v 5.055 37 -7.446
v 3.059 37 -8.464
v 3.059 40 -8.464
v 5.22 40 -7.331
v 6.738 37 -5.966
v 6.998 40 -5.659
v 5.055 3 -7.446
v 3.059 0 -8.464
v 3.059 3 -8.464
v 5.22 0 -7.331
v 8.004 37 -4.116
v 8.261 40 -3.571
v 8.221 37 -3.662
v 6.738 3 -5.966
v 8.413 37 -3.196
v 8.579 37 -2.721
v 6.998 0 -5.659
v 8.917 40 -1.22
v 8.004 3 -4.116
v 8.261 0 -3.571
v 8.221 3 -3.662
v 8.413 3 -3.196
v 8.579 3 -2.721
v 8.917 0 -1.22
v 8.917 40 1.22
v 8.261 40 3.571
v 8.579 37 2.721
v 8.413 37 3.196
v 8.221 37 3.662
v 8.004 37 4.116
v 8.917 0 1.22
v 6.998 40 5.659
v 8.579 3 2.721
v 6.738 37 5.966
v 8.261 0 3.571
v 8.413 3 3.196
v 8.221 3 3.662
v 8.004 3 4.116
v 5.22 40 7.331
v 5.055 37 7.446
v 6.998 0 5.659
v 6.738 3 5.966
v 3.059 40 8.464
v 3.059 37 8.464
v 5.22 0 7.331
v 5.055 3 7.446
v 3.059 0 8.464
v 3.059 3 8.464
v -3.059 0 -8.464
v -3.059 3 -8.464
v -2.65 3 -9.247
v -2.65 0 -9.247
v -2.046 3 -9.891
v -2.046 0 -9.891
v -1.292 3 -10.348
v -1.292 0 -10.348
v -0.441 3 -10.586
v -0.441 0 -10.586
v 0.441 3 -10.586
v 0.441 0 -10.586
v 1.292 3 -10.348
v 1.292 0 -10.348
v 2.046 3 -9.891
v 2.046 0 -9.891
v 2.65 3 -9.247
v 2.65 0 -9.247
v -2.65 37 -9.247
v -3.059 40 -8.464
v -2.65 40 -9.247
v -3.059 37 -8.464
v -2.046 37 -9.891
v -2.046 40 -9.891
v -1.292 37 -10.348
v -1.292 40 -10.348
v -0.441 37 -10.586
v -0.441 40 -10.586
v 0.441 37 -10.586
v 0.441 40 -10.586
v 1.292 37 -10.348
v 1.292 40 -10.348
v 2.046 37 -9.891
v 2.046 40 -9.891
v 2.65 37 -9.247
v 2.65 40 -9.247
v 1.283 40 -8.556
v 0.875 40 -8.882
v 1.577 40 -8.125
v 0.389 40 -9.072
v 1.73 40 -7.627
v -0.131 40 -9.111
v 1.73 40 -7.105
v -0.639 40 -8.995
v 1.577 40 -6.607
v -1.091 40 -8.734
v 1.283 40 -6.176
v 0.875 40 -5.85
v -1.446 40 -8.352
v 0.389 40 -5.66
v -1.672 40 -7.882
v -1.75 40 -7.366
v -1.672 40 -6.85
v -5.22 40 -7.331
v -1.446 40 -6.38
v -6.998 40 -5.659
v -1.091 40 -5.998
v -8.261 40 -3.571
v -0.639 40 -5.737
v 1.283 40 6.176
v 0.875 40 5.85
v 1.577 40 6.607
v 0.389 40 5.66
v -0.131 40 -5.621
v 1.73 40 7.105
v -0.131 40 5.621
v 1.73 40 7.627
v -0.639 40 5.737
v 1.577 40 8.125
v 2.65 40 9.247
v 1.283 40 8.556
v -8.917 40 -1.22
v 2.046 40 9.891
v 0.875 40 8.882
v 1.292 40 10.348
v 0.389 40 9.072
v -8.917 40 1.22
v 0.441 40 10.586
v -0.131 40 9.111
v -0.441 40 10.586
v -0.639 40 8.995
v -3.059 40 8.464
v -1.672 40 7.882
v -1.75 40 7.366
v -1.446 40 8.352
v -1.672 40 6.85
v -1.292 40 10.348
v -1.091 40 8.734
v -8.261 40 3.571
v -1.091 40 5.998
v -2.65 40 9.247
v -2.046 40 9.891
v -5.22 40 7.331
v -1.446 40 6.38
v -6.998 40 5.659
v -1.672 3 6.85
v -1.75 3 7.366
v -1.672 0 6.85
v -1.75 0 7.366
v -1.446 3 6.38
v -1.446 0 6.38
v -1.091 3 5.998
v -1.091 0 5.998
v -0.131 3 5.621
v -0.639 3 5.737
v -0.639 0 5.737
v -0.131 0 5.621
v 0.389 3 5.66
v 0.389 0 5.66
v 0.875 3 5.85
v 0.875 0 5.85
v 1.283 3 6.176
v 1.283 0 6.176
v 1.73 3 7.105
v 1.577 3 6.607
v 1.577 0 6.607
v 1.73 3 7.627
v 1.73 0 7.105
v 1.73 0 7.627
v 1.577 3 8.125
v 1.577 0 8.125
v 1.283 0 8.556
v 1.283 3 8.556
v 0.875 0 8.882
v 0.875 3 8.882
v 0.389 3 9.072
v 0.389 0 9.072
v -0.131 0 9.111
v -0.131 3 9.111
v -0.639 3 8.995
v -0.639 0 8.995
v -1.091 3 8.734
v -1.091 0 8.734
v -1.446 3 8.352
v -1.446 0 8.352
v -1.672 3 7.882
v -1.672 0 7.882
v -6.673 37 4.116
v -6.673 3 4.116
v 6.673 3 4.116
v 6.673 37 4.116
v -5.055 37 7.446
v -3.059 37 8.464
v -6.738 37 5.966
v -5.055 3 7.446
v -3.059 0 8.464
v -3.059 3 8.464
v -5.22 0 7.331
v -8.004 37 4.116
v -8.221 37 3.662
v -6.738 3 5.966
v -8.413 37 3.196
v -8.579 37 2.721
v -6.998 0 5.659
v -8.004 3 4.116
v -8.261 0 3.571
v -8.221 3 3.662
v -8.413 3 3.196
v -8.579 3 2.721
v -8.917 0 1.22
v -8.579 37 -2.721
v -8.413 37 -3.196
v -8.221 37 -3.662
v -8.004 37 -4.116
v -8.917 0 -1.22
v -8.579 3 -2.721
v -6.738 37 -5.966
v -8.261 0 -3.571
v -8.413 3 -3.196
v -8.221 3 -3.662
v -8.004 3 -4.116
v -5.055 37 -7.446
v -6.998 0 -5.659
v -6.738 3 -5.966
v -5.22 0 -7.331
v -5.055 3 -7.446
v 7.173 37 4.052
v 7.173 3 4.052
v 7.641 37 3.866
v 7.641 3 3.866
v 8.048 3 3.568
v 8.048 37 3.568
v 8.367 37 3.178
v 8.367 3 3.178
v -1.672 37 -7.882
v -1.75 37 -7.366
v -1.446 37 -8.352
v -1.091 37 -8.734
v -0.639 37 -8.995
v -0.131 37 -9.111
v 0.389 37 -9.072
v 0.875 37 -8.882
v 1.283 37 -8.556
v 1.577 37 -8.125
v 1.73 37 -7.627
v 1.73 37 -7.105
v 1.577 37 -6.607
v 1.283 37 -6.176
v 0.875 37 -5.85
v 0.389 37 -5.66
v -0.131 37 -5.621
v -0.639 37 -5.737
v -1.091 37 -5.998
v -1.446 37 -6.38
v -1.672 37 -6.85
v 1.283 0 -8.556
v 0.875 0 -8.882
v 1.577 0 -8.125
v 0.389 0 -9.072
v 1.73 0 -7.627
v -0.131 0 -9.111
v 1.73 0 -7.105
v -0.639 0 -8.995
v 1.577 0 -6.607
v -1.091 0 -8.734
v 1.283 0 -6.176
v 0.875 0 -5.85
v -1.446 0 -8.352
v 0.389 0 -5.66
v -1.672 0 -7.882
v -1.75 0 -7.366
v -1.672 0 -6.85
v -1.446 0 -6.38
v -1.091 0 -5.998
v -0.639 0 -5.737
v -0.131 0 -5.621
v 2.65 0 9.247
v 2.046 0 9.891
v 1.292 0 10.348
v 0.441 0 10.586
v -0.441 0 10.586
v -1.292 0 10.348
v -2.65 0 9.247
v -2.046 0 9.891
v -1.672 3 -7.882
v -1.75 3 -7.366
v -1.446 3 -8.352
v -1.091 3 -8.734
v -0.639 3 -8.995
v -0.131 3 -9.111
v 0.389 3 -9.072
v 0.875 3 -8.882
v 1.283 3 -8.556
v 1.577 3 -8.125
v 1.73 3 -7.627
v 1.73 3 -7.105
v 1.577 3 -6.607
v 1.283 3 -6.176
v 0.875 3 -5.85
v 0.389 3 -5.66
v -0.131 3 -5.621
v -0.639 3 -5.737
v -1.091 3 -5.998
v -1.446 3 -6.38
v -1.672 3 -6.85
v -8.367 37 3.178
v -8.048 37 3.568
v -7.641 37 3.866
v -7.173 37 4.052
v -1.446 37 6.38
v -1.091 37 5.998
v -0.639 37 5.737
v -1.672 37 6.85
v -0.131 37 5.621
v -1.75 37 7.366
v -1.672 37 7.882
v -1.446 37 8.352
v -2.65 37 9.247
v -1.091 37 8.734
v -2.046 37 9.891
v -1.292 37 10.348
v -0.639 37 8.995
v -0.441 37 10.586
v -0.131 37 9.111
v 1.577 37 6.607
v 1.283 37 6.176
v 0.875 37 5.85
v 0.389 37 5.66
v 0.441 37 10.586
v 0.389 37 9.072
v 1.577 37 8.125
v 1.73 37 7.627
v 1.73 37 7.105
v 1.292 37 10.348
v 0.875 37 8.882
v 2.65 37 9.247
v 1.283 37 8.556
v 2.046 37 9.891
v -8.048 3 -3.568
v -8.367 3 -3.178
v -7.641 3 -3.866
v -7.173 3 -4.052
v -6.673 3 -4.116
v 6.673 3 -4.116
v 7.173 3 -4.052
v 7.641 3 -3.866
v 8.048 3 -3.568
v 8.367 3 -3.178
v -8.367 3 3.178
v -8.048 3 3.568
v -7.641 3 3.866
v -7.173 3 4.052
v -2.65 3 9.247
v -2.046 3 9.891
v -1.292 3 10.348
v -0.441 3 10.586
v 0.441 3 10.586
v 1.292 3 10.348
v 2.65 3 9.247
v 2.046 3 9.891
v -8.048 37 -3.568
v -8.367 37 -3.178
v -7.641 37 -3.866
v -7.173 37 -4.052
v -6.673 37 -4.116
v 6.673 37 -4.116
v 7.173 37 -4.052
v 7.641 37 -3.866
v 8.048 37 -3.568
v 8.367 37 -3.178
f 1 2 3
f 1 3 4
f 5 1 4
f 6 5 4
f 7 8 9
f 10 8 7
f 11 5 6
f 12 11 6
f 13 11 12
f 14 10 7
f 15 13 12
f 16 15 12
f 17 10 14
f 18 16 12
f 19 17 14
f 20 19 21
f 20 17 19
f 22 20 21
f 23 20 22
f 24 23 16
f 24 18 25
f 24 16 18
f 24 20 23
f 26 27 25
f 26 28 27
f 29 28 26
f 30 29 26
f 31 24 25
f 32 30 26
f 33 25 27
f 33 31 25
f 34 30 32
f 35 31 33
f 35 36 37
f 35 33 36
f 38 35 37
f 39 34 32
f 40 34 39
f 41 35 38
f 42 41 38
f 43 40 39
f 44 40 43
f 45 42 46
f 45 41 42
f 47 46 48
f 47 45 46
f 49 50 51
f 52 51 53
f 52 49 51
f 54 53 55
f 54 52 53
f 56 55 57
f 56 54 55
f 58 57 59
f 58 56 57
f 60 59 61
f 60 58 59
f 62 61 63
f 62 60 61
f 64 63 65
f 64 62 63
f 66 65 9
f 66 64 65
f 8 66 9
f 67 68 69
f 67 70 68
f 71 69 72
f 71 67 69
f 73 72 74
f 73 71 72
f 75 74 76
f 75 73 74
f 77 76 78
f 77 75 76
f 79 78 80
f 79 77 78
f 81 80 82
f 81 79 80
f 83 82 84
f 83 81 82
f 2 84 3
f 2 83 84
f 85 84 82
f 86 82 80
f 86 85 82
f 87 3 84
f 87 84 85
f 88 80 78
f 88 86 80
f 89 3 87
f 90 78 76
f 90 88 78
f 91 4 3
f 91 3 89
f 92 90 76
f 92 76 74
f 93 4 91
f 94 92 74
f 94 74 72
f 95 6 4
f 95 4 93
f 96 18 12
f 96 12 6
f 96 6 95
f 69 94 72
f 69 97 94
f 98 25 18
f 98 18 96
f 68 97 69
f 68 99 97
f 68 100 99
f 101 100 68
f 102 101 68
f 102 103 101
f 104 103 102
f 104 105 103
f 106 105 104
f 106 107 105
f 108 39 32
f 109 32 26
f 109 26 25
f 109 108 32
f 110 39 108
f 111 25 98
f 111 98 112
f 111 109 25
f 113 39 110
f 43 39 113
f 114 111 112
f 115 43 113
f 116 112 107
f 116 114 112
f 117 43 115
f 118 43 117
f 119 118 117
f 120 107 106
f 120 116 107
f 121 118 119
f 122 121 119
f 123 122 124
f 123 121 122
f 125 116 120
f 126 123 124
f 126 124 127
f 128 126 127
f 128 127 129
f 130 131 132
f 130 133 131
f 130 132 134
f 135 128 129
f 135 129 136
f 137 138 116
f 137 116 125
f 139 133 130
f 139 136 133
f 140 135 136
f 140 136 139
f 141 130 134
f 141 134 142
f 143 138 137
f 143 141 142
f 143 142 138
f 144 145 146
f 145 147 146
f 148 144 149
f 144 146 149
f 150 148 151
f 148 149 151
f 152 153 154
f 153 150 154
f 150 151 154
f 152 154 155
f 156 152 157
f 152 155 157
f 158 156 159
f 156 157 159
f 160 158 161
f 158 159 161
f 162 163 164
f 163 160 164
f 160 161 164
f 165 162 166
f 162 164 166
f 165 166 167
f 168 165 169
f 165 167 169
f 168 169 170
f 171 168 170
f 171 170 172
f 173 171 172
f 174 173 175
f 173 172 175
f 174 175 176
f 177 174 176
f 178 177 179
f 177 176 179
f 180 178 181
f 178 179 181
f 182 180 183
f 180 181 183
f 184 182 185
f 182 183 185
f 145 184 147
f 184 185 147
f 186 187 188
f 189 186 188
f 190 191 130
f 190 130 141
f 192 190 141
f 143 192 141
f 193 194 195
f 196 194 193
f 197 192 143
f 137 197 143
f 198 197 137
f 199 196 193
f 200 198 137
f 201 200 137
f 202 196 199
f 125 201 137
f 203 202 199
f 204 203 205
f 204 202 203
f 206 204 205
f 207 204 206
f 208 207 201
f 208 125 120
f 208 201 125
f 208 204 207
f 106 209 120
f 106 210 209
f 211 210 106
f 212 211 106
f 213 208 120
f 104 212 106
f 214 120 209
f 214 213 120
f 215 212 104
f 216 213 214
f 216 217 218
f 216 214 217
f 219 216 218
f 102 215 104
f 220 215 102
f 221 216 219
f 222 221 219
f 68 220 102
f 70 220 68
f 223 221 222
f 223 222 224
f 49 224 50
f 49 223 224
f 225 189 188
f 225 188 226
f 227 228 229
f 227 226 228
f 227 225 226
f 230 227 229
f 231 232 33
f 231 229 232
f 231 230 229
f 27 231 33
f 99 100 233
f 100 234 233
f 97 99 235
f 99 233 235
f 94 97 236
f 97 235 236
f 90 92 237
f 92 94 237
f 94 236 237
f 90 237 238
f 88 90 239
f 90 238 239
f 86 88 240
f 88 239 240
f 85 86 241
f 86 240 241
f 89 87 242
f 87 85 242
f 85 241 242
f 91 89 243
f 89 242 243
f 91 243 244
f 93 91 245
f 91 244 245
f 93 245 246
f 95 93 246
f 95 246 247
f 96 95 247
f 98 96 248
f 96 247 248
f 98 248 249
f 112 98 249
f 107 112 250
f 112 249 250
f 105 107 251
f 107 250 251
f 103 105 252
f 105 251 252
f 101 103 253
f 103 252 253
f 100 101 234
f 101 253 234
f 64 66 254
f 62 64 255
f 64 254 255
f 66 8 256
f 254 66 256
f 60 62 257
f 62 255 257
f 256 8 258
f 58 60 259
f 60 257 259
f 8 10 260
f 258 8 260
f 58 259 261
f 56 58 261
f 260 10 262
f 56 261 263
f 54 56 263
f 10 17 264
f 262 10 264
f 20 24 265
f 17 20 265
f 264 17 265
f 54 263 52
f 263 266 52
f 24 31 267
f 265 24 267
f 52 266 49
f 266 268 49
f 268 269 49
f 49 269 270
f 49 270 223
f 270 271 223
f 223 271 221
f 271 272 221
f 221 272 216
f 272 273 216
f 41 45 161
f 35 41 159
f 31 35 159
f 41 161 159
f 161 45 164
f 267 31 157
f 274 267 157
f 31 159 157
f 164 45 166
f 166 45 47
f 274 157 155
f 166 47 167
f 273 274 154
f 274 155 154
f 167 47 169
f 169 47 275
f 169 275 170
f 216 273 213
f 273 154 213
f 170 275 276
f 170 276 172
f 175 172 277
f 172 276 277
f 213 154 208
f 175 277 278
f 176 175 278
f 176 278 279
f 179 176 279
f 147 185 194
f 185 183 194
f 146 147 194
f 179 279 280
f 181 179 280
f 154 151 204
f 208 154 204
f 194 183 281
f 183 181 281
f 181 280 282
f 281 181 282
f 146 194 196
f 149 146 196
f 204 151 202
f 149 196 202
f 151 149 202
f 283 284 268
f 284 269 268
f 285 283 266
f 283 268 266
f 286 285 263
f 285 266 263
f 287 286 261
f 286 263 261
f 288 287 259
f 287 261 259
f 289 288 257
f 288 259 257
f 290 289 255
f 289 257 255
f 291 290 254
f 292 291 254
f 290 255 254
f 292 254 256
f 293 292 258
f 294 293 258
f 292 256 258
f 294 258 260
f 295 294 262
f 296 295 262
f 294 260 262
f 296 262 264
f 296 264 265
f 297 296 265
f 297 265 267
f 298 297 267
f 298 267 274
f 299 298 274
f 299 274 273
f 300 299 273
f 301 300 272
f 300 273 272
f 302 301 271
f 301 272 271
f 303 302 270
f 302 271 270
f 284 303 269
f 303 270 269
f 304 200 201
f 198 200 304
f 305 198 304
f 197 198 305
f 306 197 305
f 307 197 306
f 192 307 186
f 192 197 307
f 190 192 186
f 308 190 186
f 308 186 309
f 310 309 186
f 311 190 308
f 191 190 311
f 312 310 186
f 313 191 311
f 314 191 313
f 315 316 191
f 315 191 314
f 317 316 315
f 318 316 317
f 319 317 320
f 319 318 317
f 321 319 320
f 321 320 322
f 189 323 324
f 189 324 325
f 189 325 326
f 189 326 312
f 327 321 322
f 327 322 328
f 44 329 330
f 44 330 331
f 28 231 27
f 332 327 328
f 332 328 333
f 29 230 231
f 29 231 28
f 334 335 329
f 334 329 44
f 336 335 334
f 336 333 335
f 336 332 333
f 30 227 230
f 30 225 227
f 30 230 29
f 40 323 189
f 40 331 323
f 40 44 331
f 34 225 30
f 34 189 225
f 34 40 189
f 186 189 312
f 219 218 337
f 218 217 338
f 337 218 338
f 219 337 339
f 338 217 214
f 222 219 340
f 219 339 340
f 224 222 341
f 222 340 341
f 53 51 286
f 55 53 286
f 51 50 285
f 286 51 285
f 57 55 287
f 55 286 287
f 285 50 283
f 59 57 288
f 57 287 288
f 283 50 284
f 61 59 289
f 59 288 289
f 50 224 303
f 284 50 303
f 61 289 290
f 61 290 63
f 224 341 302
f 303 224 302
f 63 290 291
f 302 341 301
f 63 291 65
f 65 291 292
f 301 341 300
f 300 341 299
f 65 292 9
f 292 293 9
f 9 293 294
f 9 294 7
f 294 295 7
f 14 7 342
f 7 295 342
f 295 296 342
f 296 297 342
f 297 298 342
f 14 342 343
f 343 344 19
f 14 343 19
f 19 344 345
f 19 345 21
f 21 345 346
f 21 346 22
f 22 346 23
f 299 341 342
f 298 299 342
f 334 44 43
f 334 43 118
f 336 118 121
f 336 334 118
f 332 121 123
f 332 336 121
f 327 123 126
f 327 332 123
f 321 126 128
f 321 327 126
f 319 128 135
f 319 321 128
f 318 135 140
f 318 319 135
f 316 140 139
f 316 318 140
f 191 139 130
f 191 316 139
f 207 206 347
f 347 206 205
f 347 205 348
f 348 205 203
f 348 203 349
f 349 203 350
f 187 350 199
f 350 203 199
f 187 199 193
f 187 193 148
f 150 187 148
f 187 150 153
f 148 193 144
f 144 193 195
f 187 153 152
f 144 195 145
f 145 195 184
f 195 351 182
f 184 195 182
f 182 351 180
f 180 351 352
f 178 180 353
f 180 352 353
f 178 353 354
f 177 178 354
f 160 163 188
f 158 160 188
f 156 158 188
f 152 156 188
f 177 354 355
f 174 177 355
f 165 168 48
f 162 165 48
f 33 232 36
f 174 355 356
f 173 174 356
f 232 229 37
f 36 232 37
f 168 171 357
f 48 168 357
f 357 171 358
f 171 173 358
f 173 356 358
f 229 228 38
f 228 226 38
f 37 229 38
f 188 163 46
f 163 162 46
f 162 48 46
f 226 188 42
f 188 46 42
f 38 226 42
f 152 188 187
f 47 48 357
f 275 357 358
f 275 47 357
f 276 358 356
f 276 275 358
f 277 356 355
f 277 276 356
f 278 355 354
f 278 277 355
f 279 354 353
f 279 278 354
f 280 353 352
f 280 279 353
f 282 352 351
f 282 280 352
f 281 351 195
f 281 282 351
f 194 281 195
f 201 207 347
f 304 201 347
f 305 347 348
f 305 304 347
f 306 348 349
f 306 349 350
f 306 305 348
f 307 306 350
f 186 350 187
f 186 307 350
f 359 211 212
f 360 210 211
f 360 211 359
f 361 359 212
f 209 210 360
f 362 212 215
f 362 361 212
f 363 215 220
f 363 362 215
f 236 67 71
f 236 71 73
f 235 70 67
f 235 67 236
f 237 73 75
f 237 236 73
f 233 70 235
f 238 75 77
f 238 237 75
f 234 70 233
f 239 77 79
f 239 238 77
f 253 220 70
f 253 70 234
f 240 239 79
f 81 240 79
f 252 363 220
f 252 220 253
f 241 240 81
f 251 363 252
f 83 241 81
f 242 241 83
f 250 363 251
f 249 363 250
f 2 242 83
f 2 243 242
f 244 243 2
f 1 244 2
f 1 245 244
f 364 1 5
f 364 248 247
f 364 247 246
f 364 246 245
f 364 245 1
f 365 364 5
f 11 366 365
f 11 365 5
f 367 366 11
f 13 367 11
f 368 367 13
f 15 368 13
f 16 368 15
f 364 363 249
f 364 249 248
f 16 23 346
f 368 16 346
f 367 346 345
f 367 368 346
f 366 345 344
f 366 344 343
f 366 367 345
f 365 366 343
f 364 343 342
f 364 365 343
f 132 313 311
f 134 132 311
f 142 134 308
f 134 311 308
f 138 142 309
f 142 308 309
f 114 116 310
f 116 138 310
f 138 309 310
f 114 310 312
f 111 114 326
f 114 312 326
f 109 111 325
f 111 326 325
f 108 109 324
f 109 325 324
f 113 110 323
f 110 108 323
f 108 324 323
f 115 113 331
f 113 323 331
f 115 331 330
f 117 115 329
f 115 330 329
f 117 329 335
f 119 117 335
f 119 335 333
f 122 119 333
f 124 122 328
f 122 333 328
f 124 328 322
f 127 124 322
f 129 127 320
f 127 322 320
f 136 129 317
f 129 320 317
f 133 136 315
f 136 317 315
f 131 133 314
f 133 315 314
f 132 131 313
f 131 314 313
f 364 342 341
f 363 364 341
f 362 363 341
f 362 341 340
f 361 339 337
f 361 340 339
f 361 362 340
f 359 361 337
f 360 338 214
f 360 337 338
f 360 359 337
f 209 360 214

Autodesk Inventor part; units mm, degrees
ref_plane "YZ Plane" through (0, 0, 0) normal (1, 0, 0) x (0, 1, 0)
ref_plane "XZ Plane" through (0, 0, 0) normal (0, 1, 0) x (-1, 0, 0)
sketch "Sketch1" plane through (0, 0, 0) normal (0, 1, 0) x (-1, 0, 0)
  circle A0 centre (0, 7.366) radius 1.75
  circle A1 centre (0, -7.366) radius 1.75
  arc A2 (3.0588, -8.4643) -> (3.0588, 8.4643) centre (0, 0) ccw
  arc A3 (-3.0588, 8.4643) -> (-3.0588, -8.4643) centre (0, 0) ccw
  arc A4 (3.0588, 8.4643) -> (-3.0588, 8.4643) centre (0, 7.366) ccw
  arc A5 (-3.0588, -8.4643) -> (3.0588, -8.4643) centre (0, -7.366) ccw
  point P0 (9, 0)
extrude "Extrusion1" add sketch "Sketch1" along normal blind 40
ref_plane "Work Plane1" through (0, 3, 0) normal (0, -1, 0) x (1, 0, 0)
sketch "Sketch2" plane through (0, 3, 0) normal (0, -1, 0) x (1, 0, 0)
  circle A0 centre (0, -7.366) radius 1.75
  circle A1 centre (0, 7.366) radius 1.75
  arc A2 (3.0588, -8.4643) -> (3.0588, 8.4643) centre (0, 0) ccw
  arc A3 (3.0588, 8.4643) -> (-3.0588, 8.4643) centre (0, 7.366) ccw
  arc A4 (-3.0588, 8.4643) -> (-3.0588, -8.4643) centre (0, 0) ccw
  arc A5 (-3.0588, -8.4643) -> (3.0588, -8.4643) centre (0, -7.366) ccw
  arc A6 (3.0588, 8.4643) -> (-3.0588, 8.4643) centre (0, 7.366) ccw
  arc A7 (-3.0588, -8.4643) -> (3.0588, -8.4643) centre (0, -7.366) ccw
  line L0 (0, 4.116) -> (8.0037, 4.116)
  line L1 (0, 4.116) -> (-8.0037, 4.116)
  line L2 (0, -4.116) -> (8.0037, -4.116)
  line L3 (0, -4.116) -> (-8.0037, -4.116)
extrude "Extrusion2" cut sketch "Sketch2" against normal blind 34 contours A5 A4 L3 L2 A2 | L0 L1 A4 A3 A2
fillet "Fillet1" radius 2 4 edges at (8.0037, 20, 4.116) (-8.0037, 20, 4.116) (8.0037, 20, -4.116) (-8.0037, 20, -4.116)
properties part number "Ball Caster Spacer"
